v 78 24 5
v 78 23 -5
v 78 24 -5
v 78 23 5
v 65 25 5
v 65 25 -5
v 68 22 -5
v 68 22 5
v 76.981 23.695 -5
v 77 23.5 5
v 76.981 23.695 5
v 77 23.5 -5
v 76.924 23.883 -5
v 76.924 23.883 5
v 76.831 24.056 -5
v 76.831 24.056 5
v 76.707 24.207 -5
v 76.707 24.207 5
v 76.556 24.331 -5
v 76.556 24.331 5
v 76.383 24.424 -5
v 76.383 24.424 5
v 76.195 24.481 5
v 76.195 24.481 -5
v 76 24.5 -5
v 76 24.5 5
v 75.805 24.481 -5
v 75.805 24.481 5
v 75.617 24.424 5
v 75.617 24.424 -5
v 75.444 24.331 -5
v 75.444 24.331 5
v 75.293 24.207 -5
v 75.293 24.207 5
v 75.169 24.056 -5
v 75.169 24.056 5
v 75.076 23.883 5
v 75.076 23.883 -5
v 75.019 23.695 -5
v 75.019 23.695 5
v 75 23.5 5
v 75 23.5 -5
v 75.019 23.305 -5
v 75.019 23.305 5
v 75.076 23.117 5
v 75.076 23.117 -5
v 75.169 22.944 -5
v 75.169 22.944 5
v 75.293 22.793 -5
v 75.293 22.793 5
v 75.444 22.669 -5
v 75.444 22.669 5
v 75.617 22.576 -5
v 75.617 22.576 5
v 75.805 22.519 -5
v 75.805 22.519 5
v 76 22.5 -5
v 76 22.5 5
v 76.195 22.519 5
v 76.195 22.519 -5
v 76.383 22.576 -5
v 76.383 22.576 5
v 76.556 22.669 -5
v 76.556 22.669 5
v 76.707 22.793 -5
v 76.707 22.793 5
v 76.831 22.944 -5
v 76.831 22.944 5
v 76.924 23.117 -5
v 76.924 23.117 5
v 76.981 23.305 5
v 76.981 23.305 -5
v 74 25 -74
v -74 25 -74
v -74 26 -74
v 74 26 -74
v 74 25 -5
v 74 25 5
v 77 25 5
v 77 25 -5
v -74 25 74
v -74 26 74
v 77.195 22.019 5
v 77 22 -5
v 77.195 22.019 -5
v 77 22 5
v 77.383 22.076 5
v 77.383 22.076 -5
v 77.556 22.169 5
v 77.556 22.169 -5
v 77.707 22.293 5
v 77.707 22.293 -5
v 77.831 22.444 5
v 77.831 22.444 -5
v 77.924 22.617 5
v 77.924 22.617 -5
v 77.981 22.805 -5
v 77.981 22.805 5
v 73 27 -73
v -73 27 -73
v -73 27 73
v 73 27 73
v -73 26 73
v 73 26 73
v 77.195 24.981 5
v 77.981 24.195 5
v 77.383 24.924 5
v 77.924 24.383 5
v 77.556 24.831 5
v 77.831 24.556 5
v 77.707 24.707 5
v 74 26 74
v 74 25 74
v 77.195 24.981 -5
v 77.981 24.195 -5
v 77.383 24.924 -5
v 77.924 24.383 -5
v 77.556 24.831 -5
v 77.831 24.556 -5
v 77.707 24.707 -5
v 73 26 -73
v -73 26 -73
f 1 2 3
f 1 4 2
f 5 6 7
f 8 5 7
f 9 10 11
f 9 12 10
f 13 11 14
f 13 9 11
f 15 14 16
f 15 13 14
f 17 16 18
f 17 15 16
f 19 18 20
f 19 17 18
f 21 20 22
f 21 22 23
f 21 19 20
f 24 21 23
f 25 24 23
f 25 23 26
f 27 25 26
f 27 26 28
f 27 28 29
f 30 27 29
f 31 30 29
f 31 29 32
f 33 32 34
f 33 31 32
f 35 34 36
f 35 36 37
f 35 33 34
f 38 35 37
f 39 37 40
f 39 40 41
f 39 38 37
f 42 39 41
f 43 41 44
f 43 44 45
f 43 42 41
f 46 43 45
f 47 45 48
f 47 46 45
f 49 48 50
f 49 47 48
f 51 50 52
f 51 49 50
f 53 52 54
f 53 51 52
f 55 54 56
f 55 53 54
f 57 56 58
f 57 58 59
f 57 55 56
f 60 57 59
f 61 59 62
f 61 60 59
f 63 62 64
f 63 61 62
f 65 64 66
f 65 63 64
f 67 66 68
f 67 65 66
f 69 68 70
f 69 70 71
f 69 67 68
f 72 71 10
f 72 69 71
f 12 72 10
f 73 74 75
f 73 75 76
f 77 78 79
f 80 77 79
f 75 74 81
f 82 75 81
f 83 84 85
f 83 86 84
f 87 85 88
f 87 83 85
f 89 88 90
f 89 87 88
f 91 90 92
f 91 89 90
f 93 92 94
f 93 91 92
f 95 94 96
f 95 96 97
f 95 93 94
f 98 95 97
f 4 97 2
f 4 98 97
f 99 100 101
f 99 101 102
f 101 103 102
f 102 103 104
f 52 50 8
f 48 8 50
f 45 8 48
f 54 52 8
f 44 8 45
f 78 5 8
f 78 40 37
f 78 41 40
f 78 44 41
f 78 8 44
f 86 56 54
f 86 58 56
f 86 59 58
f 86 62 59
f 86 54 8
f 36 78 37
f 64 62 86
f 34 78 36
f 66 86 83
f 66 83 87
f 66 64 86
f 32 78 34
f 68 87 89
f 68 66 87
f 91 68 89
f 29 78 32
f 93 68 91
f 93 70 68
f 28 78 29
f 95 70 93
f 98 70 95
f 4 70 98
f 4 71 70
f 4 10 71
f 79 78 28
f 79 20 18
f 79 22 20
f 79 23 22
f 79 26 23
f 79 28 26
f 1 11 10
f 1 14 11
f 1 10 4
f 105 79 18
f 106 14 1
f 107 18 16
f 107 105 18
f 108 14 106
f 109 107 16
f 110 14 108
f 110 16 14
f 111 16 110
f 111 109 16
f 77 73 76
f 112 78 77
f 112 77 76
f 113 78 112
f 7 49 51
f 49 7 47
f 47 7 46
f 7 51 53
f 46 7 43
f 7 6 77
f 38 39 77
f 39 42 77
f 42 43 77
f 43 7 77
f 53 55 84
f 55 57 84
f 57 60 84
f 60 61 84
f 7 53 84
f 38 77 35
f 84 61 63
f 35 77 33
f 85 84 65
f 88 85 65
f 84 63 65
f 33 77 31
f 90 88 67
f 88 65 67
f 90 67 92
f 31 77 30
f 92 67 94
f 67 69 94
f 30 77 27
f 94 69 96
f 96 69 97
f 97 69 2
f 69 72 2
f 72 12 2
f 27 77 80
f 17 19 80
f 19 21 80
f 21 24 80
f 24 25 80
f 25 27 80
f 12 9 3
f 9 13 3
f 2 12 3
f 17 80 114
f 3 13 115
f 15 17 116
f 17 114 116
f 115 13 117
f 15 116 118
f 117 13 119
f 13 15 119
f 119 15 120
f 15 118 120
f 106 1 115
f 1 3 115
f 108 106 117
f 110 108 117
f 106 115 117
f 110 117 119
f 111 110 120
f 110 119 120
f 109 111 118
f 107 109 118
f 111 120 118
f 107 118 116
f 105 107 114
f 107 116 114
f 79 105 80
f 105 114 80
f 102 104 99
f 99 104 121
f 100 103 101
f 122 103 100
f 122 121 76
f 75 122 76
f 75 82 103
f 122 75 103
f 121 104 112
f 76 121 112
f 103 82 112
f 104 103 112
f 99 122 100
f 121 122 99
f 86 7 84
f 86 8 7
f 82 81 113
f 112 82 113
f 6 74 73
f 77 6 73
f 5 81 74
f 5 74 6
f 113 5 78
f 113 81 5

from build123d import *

# Parameters (mm, degrees)
SKETCH1_R           = 10
SKETCH1_R_2         = 7.5
BOSS_EXTRUDE1_DEPTH = 25
THREAD1_PITCH       = 0.3175
SKETCH4_W           = 146
SKETCH4_H           = 146
BOSS_EXTRUDE2_DEPTH = 2
SKETCH5_W           = 148
SKETCH5_H           = 148
BOSS_EXTRUDE3_DEPTH = 1
SKETCH6_W           = 10
SKETCH6_H           = 3
SKETCH6_R           = 1
BOSS_EXTRUDE4_DEPTH = 5
CHAMFER2_START      = -5
CHAMFER2_DEPTH      = 10
SKETCH9_R           = 10
CUT_EXTRUDE1_DEPTH  = 111.385687501
FILLET1_R           = 1


with BuildPart() as part:
    # Sketch1 → Boss-Extrude1 (new body)
    with BuildSketch(Plane(origin=(0, 0, 0), x_dir=(1, 0, 0), z_dir=(0, 1, 0))):
        with Locations(Location((0, 0, 0), (0, 0, 270))):
            Circle(SKETCH1_R)
        with Locations(Location((0, 0, 0), (0, 0, 270))):
            Circle(SKETCH1_R_2, mode=Mode.SUBTRACT)
    extrude(amount=BOSS_EXTRUDE1_DEPTH)

    # Thread1: arcs per turn and ends read off the stored shape
    # Thread1: the profile of Thread Profile1 profile screwed along a right-hand helix through 18.897638 turns, 6 arcs to a turn; built about Z, then put on its axis
    thread1_z = Axis((0, 0, 0), (0, 0, 1))
    thread1_corners = [(10.0003, 0, -0.000173205), (10.0003, 0, 0.277985704), (9.828148085, 0, 0.17859375), (9.828148085, 0, 0.09921875)]
    with BuildLine(mode=Mode.PRIVATE) as thread1_profile:
        Line(thread1_corners[0], thread1_corners[1])
        Line(thread1_corners[1], thread1_corners[2])
        Line(thread1_corners[2], thread1_corners[3])
        Line(thread1_corners[3], thread1_corners[0])
    thread1_cap = Face(thread1_profile.wire())
    thread1_turn_angles = [0, 30, 60, 90, 120, 150, 180, 210, 240, 270, 300, 330, 360]
    thread1_turn_weights = [1, 0.8660254037844387, 1, 0.8660254037844387, 1, 0.8660254037844387, 1, 0.8660254037844387, 1, 0.8660254037844387, 1, 0.8660254037844387, 1]
    thread1_turn_rails = [Edge.make_bspline([Vector(p[0], p[1], 0).rotate(thread1_z, thread1_turn_angles[k]) / thread1_turn_weights[k] + Vector(0, 0, p[2] + THREAD1_PITCH * thread1_turn_angles[k] / 360) for k in range(13)], [0, 0, 0, 1, 1, 2, 2, 3, 3, 4, 4, 5, 5, 6, 6, 6], 2, thread1_turn_weights) for p in thread1_corners]
    thread1_turn_sides = [Face.make_surface_from_curves(thread1_turn_rails[p[0]], thread1_turn_rails[p[1]]) for p in [(0, 1), (1, 2), (2, 3), (3, 0)]]
    thread1_last_angles = [6480, 6510, 6540, 6570, 6600, 6630, 6660, 6690, 6720, 6750, 6780, 6791.57480315, 6803.149606299]
    thread1_last_weights = [1, 0.8660254037844387, 1, 0.8660254037844387, 1, 0.8660254037844387, 1, 0.8660254037844387, 1, 0.8660254037844387, 1, 0.9796635825089068, 1]
    thread1_last_rails = [Edge.make_bspline([Vector(p[0], p[1], 0).rotate(thread1_z, thread1_last_angles[k]) / thread1_last_weights[k] + Vector(0, 0, p[2] + THREAD1_PITCH * thread1_last_angles[k] / 360) for k in range(13)], [0, 0, 0, 1, 1, 2, 2, 3, 3, 4, 4, 5, 5, 6, 6, 6], 2, thread1_last_weights) for p in thread1_corners]
    thread1_last_sides = [Face.make_surface_from_curves(thread1_last_rails[p[0]], thread1_last_rails[p[1]]) for p in [(0, 1), (1, 2), (2, 3), (3, 0)]]
    thread1 = Plane(origin=(0, -0.5, 0), x_dir=(1, 0, 0), z_dir=(0, 1, 0)) * Solid(Shell([*[p.moved(Location((0, 0, THREAD1_PITCH * i))) for i in range(18) for p in thread1_turn_sides], *thread1_last_sides, thread1_cap, thread1_cap.rotate(thread1_z, 6803.149606299).moved(Location((0, 0, THREAD1_PITCH * 6803.149606299 / 360)))]))
    add(thread1, mode=Mode.SUBTRACT)

    # Sketch4 → Boss-Extrude2 (add)
    with BuildSketch(Plane(origin=(0, 25, 0), x_dir=(1, 0, 0), z_dir=(0, 1, 0))):
        Rectangle(SKETCH4_W, SKETCH4_H)
    extrude(amount=BOSS_EXTRUDE2_DEPTH)

    # Sketch5 → Boss-Extrude3 (add)
    with BuildSketch(Plane.XZ.offset(-25)):
        Rectangle(SKETCH5_W, SKETCH5_H)
    extrude(amount=-BOSS_EXTRUDE3_DEPTH)

    # Sketch6 → Boss-Extrude4 (add, symmetric)
    with BuildSketch(Plane.XY):
        with Locations((73, 23.5)):
            Rectangle(SKETCH6_W, SKETCH6_H)
        with Locations((76, 23.5)):
            Circle(SKETCH6_R, mode=Mode.SUBTRACT)
    extrude(amount=BOSS_EXTRUDE4_DEPTH, both=True)

    # Chamfer2: read off the stored shape, not the designer's step
    # Chamfer2 outline → Chamfer2 (add)
    with BuildSketch(Plane.XY.offset(CHAMFER2_START)):
        Polygon((68, 25), (65, 25), (68, 22), align=None)
    extrude(amount=CHAMFER2_DEPTH)

    # Sketch9 → Cut-Extrude1 (cut, through all)
    with BuildSketch(Plane.XZ.offset(-25)):
        Circle(SKETCH9_R)
    extrude(amount=CUT_EXTRUDE1_DEPTH, mode=Mode.SUBTRACT)

    # Fillet1
    fillet1_edges = [part.edges().sort_by_distance(p)[0] for p in [
        (78, 22, 0),
        (78, 25, 0),
    ]]
    fillet(fillet1_edges, radius=FILLET1_R)


solid = part.part
